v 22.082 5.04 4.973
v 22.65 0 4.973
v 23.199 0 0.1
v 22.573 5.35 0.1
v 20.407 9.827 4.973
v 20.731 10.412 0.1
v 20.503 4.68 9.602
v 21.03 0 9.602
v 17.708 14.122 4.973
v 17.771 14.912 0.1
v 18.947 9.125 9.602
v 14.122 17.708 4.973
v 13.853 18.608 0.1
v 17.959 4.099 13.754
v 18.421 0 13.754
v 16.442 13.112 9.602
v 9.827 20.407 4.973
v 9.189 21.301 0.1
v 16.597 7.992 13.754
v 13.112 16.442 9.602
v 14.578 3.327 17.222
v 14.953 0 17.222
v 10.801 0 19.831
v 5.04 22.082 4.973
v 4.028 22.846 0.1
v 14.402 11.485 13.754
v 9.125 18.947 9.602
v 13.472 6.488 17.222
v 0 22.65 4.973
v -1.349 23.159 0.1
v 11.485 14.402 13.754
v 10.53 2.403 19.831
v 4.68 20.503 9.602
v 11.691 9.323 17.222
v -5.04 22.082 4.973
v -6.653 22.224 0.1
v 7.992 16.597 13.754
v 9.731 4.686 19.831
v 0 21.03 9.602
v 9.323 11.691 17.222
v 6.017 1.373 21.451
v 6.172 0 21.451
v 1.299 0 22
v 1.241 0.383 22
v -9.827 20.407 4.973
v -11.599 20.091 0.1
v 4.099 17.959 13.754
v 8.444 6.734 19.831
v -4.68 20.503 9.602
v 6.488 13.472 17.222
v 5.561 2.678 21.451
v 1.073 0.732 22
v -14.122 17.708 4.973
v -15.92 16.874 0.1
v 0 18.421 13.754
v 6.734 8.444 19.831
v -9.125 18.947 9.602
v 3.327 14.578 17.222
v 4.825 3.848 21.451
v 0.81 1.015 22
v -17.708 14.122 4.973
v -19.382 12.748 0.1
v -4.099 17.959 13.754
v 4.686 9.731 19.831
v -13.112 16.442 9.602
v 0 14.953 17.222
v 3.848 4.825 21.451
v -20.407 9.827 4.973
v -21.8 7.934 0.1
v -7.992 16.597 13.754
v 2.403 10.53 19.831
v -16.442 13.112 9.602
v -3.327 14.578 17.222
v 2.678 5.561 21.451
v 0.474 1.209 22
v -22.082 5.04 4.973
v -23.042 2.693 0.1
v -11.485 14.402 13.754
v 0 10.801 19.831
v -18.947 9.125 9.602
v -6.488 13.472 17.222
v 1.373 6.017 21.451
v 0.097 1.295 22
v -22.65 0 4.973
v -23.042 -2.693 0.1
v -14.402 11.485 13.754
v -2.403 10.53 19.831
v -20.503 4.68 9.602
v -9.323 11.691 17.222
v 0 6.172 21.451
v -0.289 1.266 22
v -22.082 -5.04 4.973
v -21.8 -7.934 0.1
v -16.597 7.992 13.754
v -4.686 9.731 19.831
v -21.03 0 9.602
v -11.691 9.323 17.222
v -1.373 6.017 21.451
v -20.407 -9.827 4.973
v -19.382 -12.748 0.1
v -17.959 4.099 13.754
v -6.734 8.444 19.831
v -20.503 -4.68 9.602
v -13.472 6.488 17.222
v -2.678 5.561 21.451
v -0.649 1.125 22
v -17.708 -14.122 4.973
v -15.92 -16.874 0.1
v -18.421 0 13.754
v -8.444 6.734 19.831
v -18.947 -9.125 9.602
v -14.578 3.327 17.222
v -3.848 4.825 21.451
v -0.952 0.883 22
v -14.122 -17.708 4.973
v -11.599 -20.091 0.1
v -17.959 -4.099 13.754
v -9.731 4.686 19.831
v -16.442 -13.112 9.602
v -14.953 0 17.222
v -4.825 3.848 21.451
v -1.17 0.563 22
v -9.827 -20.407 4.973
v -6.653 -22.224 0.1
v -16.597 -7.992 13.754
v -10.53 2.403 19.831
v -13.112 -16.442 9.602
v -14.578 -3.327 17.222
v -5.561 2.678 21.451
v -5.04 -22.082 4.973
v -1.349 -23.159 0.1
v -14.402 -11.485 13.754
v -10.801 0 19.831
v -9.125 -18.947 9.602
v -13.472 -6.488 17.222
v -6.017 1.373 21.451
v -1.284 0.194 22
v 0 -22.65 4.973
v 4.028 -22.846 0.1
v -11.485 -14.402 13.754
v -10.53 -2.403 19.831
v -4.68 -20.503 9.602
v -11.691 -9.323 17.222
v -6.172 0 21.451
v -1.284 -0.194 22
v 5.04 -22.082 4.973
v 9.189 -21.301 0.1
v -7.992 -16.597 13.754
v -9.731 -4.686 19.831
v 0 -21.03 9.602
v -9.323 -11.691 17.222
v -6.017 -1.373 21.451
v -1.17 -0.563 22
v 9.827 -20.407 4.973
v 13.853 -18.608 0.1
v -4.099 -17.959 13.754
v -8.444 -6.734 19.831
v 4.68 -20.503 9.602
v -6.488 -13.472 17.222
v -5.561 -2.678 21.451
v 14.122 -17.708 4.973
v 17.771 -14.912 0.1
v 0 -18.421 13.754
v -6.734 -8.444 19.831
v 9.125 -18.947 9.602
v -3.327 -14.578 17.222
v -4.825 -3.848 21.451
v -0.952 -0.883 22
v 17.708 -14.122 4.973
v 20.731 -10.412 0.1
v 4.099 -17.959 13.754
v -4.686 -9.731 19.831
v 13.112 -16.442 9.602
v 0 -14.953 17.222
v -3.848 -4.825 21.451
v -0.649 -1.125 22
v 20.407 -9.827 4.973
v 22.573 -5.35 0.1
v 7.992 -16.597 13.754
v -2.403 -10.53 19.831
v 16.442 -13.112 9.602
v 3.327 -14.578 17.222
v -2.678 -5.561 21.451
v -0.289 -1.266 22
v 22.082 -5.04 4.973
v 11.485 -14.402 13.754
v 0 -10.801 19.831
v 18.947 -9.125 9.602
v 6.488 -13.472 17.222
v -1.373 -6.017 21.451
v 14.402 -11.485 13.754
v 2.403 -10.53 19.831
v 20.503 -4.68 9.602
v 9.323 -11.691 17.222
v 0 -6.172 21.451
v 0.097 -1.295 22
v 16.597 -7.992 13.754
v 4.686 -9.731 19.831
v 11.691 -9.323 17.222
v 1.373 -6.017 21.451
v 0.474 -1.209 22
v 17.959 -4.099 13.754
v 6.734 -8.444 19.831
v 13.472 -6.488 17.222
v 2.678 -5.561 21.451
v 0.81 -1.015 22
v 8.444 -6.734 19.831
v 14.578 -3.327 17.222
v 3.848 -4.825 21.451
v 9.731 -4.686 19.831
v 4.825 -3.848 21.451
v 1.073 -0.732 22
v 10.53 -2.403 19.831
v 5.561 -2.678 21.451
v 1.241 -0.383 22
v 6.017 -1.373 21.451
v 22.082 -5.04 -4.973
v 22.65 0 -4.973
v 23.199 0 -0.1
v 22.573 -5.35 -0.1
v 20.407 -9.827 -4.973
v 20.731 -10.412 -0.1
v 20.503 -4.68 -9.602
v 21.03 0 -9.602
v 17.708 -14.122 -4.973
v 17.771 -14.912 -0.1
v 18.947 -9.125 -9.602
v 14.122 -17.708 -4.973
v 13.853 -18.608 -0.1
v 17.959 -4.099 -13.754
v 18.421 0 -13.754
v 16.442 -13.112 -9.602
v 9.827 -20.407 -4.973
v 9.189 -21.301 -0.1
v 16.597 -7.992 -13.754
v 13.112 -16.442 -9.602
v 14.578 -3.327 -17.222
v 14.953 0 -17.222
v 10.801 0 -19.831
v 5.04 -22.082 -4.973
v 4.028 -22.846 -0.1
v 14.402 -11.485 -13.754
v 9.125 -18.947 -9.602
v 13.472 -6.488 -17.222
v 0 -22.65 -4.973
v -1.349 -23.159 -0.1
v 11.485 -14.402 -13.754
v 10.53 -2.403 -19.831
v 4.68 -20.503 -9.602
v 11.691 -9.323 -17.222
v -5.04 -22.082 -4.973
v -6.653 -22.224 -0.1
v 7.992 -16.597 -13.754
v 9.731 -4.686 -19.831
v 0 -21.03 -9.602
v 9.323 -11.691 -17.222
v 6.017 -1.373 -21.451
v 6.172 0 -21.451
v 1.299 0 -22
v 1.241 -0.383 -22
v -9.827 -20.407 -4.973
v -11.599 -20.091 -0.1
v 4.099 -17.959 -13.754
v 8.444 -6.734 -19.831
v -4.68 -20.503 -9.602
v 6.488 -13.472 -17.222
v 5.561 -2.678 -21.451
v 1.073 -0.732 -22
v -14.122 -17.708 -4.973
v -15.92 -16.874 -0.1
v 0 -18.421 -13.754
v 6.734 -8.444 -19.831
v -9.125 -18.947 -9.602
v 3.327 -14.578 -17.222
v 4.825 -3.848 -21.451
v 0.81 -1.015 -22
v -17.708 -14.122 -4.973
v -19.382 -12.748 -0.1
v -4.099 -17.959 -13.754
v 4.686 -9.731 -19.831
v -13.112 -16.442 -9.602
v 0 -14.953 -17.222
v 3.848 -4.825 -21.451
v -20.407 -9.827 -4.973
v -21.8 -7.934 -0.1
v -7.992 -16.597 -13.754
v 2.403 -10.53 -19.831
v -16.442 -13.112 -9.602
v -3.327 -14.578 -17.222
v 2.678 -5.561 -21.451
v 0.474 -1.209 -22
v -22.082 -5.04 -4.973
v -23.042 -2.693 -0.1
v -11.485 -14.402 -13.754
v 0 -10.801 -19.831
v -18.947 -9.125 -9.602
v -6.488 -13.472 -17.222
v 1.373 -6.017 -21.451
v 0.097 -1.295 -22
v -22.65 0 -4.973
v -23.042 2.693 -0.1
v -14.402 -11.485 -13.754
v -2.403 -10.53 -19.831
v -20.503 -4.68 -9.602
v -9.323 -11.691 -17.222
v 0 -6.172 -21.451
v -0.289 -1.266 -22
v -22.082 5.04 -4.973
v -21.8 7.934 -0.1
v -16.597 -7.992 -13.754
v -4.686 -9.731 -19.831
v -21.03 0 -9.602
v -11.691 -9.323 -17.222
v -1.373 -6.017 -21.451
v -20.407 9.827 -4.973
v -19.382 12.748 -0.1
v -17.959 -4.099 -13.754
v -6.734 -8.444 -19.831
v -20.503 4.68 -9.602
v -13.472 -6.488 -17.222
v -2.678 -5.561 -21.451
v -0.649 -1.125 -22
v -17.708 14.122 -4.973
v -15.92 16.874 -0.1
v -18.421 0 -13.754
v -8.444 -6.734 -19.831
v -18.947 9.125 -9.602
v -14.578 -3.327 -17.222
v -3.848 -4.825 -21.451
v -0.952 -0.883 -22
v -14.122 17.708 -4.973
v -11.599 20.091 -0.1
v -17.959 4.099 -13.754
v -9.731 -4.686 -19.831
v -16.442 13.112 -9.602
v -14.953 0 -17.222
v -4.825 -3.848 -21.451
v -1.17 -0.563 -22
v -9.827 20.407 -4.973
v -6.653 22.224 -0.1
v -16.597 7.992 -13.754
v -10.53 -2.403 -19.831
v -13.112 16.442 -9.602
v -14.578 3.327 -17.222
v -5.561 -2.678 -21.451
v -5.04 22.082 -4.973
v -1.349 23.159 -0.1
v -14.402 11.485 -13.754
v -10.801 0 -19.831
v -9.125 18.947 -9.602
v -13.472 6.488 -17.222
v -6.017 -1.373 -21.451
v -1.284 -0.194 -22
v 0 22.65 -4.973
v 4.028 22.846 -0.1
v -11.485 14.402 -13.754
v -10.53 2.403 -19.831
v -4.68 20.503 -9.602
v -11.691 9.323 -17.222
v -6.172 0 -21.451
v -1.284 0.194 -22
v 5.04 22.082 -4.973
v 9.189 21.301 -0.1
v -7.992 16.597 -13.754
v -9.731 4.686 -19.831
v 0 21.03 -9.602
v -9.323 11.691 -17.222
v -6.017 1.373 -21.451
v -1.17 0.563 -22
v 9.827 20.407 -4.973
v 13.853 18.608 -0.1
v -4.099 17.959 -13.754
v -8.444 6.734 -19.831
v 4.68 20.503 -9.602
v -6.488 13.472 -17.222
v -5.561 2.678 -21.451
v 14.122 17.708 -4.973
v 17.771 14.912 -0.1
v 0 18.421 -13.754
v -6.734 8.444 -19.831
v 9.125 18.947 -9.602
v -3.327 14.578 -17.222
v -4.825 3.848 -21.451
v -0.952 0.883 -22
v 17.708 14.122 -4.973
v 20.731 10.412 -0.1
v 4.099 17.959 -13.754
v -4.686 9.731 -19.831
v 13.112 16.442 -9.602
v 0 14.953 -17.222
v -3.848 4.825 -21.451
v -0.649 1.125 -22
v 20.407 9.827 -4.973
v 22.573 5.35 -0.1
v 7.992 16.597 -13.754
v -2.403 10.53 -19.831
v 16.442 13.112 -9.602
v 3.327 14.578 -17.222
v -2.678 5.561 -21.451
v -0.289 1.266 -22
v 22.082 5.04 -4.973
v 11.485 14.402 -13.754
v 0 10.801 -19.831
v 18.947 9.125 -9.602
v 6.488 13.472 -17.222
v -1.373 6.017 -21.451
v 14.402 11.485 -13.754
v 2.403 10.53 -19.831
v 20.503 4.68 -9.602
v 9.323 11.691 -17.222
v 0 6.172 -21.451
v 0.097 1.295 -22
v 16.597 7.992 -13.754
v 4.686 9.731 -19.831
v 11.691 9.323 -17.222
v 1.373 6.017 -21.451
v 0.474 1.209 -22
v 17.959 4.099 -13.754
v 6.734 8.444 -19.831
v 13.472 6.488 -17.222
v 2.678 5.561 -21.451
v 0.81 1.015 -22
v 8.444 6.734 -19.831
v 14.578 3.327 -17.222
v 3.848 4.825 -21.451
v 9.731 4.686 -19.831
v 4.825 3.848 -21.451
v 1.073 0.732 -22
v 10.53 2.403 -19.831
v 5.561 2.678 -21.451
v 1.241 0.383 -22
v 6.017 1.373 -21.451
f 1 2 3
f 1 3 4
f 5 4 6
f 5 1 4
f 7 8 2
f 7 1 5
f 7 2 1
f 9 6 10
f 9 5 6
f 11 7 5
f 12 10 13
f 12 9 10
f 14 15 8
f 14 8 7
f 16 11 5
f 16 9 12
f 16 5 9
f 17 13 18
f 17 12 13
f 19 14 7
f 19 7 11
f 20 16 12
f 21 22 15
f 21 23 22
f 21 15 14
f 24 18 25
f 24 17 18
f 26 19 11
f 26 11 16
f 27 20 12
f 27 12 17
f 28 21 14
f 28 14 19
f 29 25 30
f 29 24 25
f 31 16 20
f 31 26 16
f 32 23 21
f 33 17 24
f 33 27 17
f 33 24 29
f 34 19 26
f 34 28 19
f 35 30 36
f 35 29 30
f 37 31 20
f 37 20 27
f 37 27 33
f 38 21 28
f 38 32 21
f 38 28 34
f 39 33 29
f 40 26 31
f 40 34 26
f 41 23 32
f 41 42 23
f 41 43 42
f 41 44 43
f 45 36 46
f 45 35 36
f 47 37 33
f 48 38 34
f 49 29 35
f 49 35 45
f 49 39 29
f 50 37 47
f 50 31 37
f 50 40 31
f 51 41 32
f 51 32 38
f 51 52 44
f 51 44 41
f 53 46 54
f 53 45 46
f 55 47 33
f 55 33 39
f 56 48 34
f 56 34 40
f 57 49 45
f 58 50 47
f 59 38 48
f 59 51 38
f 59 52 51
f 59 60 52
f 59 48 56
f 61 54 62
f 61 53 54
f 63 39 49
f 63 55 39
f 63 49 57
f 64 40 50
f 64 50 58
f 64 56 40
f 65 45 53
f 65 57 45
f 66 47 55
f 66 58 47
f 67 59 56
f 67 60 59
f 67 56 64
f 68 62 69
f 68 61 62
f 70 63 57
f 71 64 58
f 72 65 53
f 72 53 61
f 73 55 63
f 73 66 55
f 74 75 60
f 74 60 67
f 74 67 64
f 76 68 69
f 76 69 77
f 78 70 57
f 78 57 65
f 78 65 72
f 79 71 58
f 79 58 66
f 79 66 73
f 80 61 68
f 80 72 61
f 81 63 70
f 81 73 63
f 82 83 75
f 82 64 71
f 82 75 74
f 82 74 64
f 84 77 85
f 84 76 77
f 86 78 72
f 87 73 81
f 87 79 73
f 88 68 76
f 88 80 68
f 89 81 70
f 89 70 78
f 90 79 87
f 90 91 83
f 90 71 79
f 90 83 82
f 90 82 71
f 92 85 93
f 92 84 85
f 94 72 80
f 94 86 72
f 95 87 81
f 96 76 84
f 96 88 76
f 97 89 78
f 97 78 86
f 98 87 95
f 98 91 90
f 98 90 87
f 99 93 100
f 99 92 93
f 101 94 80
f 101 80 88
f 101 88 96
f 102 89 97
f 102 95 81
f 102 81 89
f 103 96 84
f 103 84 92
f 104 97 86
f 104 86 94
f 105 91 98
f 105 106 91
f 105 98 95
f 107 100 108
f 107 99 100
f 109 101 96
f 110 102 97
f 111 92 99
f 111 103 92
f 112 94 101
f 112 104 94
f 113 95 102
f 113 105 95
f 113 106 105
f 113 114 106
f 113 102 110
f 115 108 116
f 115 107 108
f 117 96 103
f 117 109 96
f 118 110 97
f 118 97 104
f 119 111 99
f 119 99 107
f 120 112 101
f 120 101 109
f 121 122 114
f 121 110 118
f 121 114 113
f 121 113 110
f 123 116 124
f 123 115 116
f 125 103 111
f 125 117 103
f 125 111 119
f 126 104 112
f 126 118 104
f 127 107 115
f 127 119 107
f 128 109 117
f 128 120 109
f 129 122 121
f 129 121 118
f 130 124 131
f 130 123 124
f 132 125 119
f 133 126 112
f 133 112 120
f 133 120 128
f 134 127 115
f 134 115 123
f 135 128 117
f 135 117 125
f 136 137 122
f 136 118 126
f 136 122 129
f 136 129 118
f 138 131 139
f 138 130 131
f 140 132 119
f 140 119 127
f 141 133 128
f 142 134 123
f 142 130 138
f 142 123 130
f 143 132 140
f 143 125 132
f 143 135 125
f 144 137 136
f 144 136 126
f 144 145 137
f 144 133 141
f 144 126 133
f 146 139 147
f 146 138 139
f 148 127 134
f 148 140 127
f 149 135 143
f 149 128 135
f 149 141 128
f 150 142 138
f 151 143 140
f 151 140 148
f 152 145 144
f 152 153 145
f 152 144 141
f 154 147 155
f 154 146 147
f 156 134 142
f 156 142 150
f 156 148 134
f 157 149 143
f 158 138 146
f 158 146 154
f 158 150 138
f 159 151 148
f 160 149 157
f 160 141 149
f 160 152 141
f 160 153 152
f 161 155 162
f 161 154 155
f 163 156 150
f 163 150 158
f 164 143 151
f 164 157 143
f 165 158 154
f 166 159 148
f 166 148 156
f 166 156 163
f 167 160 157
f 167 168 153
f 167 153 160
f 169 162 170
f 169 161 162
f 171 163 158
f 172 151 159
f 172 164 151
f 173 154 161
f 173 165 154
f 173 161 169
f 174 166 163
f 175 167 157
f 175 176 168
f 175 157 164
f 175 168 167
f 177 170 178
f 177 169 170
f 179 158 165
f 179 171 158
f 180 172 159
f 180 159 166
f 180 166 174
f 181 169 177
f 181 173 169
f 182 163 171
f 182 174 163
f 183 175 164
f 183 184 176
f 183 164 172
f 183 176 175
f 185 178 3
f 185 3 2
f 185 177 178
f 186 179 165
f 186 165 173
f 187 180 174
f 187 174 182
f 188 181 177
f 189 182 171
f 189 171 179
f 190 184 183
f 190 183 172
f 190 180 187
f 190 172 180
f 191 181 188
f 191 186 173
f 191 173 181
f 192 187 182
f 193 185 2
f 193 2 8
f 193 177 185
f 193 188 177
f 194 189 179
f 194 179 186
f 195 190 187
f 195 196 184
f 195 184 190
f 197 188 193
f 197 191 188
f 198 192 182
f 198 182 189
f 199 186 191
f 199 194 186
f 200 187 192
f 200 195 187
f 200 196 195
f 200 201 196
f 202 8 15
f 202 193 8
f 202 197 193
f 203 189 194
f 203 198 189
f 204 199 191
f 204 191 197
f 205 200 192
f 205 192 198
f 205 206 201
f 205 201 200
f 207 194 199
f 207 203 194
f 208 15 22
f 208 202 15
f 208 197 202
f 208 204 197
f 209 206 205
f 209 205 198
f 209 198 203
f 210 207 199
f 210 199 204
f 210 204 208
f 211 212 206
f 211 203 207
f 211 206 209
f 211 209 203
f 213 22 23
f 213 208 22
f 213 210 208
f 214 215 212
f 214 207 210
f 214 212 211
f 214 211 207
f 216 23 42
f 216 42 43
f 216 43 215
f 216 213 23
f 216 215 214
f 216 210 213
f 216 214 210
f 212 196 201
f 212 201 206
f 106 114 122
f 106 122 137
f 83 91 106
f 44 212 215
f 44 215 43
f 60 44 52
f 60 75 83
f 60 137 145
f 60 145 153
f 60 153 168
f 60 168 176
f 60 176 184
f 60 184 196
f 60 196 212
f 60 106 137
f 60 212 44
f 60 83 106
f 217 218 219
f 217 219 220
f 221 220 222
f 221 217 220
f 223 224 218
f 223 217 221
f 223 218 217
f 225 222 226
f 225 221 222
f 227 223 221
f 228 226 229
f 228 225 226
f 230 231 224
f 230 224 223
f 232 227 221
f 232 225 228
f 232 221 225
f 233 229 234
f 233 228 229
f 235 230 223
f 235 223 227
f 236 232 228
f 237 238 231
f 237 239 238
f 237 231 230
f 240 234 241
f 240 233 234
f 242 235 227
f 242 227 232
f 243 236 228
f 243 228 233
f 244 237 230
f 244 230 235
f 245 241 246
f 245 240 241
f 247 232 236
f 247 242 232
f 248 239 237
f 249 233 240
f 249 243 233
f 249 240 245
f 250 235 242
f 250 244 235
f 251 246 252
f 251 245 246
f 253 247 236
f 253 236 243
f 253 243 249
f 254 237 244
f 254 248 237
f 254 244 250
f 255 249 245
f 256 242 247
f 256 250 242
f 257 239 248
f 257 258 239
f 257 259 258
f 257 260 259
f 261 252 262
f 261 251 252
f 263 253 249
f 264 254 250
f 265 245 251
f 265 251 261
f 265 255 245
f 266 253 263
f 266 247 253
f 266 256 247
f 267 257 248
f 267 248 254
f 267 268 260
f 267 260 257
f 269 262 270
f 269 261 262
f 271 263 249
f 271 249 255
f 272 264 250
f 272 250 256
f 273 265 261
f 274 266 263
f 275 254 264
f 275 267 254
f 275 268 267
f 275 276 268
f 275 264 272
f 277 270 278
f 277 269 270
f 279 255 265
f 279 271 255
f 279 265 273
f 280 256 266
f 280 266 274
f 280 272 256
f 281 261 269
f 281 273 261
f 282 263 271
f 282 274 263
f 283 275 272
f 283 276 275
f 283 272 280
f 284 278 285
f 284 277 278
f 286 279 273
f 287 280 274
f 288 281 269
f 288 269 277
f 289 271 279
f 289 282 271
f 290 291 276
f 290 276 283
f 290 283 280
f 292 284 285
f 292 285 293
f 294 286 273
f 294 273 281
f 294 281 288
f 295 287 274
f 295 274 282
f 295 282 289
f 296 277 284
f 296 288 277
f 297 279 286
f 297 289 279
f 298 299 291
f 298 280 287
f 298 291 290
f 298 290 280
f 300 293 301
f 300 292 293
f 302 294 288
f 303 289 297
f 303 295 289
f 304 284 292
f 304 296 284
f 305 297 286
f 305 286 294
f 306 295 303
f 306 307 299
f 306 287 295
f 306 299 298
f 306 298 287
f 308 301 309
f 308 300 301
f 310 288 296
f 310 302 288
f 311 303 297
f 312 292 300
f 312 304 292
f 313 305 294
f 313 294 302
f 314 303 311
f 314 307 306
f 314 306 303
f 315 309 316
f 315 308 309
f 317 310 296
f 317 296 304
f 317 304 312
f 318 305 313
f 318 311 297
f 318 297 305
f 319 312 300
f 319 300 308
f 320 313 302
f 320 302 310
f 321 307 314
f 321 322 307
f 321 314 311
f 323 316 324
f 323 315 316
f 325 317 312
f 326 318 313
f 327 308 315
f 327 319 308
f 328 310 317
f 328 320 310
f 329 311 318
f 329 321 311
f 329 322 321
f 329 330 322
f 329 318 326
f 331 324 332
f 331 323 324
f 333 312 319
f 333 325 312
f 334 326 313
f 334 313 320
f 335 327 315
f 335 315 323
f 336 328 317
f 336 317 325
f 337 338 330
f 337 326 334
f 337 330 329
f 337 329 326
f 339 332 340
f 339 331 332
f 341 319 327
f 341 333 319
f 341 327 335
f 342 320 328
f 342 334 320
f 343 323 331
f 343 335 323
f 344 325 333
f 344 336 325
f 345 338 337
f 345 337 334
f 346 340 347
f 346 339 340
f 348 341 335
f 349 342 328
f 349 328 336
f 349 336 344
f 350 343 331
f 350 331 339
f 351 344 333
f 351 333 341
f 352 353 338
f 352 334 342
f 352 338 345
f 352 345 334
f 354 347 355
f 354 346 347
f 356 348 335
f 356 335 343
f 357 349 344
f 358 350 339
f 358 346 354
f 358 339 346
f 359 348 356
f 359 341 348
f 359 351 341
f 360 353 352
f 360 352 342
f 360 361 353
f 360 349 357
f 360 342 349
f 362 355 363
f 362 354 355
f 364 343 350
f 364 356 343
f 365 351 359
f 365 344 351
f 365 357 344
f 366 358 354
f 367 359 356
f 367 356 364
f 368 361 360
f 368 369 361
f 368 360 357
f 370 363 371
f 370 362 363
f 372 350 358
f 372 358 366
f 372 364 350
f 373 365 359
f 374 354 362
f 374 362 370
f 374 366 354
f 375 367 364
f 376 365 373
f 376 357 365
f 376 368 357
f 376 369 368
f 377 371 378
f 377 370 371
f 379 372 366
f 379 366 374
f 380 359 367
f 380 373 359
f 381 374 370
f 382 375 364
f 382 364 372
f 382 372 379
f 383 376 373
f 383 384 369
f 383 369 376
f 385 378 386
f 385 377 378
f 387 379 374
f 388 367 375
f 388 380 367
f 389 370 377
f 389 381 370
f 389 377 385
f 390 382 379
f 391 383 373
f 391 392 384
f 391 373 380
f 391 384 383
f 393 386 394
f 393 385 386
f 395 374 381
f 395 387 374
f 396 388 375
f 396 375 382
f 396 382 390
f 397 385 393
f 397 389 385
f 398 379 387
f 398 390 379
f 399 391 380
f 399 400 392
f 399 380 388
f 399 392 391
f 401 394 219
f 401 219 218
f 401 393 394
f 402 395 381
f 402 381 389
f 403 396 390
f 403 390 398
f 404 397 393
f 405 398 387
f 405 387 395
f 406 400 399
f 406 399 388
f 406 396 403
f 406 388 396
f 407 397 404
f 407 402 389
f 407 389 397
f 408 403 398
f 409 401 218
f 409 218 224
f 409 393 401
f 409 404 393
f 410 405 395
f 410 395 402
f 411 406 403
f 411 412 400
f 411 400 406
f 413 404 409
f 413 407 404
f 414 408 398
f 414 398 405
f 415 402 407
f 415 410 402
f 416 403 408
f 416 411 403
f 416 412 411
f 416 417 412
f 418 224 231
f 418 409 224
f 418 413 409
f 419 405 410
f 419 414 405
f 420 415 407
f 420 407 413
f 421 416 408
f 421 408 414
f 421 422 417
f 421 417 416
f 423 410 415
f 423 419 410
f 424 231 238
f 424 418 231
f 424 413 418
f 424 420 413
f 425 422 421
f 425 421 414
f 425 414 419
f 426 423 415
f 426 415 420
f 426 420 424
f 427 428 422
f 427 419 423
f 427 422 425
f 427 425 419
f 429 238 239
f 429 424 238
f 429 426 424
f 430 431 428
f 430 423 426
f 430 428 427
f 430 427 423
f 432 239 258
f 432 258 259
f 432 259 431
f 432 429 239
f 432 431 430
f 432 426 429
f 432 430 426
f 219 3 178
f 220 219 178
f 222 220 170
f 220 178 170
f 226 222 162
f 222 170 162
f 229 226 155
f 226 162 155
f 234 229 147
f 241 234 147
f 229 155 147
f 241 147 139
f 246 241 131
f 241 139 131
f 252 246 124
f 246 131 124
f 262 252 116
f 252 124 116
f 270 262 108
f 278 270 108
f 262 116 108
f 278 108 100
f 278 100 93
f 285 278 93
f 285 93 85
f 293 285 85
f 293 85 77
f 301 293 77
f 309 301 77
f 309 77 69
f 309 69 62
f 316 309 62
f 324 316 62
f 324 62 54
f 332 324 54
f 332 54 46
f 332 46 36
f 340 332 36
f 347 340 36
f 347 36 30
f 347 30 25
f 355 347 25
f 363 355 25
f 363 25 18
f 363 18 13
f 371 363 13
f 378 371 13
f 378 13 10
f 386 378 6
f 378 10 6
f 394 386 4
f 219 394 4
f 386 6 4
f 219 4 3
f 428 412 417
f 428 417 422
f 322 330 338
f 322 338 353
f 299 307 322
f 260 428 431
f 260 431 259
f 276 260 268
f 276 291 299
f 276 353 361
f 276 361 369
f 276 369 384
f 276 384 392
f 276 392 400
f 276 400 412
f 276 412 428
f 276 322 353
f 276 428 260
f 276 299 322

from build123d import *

# Parameters (mm, degrees)
F0_R      = 23.198683
F1_DEPTH  = 22
F2_R      = 21.9
F1_FACE_R = 23.198683
F3_DEPTH  = 22
F4_R      = 21.9


with BuildPart() as f1:
    # F0 (on Top) → F1 (new body)
    with BuildSketch(Plane.XY):
        Circle(F0_R)
    extrude(amount=F1_DEPTH)

    # F2
    f2_edges = [f1.edges().sort_by_distance(p)[0] for p in [
        (-23.198683, 0, 22),
    ]]
    fillet(f2_edges, radius=F2_R)

    # F1_face (on face) → F3 (join)
    with BuildSketch(Plane(origin=(0, 0, 0), x_dir=(1, 0, 0), z_dir=(0, 0, -1))):
        Circle(F1_FACE_R)
    extrude(amount=F3_DEPTH)

    # F4
    f4_edges = [f1.edges().sort_by_distance(p)[0] for p in [
        (-23.198683, 0, -22),
    ]]
    fillet(f4_edges, radius=F4_R)


solid = f1.part
